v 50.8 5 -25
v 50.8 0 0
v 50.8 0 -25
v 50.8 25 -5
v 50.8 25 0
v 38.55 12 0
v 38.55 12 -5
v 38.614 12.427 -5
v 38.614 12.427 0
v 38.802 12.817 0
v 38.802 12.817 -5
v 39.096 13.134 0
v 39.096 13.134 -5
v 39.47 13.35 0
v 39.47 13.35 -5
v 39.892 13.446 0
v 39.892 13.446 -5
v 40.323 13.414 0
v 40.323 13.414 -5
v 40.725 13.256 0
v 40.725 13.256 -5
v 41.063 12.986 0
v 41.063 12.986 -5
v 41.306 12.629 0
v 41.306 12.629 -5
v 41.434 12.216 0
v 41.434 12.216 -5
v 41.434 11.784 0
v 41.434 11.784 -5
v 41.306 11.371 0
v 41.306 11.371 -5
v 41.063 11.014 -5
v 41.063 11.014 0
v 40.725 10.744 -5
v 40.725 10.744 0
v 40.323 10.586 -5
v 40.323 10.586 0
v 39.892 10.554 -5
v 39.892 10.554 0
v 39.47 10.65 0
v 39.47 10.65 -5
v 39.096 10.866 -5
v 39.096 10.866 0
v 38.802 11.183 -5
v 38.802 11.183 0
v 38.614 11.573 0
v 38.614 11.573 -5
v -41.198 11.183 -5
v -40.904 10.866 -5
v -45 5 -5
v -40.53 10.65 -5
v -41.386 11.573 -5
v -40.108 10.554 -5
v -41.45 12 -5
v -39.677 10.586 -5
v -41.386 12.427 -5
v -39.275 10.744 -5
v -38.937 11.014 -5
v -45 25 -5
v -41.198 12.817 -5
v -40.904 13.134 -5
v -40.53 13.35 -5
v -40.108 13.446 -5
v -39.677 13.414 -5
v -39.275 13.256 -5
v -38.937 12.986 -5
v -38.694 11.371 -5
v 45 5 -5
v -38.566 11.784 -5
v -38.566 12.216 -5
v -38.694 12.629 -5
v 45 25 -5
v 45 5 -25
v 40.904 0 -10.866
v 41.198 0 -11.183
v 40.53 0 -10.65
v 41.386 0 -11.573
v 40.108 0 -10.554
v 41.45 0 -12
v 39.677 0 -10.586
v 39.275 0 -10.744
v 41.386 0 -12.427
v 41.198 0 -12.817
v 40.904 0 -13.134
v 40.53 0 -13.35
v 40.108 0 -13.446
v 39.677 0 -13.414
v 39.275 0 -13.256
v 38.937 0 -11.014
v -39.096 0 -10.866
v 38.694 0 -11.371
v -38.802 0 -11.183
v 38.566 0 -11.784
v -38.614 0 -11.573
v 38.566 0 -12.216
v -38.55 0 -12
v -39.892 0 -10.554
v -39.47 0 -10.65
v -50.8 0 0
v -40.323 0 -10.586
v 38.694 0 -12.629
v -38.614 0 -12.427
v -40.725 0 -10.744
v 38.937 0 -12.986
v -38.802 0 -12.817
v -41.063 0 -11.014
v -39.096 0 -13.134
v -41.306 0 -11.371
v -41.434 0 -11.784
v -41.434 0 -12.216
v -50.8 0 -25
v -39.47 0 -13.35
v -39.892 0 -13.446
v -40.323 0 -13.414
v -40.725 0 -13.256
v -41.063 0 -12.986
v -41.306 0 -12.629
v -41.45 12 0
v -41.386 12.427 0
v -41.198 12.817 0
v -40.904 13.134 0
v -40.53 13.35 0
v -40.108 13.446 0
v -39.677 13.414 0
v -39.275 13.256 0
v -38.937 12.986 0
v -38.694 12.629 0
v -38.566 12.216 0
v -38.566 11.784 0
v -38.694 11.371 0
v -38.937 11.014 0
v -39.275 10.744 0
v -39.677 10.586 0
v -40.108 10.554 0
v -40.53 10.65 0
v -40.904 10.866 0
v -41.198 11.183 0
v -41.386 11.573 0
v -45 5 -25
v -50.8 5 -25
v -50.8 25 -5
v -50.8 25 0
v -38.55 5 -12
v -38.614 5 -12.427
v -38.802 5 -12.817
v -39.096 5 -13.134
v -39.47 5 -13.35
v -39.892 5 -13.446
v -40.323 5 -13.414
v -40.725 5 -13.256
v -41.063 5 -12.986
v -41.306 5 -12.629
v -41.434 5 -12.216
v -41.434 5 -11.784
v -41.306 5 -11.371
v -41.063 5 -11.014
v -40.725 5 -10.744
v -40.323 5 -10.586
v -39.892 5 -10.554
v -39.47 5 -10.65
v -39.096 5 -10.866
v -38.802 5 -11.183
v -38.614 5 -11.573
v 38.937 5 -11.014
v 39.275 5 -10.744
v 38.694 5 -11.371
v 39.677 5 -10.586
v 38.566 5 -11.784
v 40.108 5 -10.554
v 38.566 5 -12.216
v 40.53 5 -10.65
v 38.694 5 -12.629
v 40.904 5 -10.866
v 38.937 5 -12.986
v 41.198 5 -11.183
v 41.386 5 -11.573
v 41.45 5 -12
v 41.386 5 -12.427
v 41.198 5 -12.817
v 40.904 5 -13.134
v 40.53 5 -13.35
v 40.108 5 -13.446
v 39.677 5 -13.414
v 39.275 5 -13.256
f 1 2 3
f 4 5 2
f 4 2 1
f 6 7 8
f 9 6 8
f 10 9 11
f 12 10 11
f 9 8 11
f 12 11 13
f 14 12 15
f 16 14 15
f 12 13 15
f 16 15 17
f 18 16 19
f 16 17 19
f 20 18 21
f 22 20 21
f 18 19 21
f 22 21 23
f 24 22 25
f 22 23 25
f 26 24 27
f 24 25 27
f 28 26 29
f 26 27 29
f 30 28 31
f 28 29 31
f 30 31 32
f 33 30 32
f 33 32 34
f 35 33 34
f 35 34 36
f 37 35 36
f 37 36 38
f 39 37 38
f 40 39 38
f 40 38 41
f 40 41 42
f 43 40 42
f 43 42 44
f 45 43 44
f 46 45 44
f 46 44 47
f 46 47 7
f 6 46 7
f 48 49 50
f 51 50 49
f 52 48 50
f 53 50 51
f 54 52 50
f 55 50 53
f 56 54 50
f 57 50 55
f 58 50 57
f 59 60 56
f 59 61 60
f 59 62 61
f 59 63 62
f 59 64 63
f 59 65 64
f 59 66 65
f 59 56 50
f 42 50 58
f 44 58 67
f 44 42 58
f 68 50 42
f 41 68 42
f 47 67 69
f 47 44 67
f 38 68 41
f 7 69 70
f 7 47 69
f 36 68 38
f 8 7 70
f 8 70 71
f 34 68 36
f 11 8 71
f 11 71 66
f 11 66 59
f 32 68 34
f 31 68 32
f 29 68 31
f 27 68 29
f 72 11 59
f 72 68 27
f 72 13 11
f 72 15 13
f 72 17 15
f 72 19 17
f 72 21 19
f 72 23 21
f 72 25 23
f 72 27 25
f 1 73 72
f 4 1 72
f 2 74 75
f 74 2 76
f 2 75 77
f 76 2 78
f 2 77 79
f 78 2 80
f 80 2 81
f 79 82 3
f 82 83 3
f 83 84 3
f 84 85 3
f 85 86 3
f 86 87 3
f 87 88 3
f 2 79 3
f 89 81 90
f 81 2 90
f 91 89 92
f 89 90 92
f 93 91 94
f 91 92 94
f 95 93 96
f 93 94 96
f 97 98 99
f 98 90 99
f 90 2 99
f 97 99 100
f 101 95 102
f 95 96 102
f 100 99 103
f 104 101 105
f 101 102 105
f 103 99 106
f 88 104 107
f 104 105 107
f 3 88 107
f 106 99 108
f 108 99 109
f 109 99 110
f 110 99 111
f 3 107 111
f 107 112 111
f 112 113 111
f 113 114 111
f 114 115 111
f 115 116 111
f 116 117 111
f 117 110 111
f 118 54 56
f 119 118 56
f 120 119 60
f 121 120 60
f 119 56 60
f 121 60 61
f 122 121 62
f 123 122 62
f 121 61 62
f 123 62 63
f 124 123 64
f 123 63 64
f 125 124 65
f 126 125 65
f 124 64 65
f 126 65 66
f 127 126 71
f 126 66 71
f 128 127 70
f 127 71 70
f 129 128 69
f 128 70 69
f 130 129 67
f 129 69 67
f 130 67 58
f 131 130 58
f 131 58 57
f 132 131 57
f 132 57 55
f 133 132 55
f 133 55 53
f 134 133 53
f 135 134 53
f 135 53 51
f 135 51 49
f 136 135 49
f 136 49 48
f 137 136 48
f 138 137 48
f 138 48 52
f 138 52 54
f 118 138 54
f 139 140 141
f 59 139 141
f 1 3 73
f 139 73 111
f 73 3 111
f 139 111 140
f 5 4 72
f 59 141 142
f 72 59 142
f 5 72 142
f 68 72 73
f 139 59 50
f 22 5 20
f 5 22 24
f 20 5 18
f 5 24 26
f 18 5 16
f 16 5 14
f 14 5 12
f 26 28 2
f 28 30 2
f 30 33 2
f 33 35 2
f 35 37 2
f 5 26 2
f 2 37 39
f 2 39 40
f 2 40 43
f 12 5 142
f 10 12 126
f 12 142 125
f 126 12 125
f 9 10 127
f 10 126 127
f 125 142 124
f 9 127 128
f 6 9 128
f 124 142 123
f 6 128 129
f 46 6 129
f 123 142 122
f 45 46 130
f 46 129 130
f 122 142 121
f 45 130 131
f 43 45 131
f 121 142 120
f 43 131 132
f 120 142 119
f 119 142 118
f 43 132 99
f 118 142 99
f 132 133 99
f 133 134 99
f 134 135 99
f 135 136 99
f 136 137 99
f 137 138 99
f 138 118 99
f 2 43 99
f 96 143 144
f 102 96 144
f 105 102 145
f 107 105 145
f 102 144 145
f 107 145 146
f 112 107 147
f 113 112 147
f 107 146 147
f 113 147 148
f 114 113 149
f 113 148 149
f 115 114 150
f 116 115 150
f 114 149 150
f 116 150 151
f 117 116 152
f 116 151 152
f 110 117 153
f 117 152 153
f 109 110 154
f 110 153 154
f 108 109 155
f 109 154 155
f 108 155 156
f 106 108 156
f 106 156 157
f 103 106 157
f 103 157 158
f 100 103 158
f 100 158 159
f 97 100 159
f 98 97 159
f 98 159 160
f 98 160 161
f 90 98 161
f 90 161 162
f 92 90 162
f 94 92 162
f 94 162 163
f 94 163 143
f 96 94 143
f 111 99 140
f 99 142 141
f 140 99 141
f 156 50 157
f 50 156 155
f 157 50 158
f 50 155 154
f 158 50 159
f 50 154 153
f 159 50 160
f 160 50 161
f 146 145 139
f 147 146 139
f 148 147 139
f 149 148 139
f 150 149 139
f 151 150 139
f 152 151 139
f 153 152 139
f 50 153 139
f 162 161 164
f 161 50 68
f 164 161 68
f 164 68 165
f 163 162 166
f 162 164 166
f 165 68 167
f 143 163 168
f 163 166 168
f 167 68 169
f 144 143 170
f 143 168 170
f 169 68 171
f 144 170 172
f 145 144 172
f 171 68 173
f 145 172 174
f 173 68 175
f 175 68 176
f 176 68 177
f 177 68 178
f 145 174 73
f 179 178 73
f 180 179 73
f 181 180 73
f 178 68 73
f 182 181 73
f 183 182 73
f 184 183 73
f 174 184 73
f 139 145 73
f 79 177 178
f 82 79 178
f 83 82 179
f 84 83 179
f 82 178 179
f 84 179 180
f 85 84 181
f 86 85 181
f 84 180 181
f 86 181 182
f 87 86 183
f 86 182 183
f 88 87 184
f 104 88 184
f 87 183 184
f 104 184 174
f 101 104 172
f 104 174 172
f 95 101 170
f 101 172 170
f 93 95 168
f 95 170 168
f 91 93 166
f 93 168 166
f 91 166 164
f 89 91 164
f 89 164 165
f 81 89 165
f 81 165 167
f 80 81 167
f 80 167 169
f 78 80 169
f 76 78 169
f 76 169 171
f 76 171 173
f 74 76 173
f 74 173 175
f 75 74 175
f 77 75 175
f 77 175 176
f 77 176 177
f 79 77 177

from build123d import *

# Parameters (mm, degrees)
BOSS_EXTRUDE1_START = -50.8
BOSS_EXTRUDE1_DEPTH = 101.6
HOLLOW_START        = 45
SKETCH3_W           = 20
SKETCH3_H           = 20
HOLLOW_DEPTH        = 90
BOTTOM_HOLES_D      = 2.9
FRONT_HOLES_D       = 2.9


with BuildPart() as part:
    # Sketch1 → Boss-Extrude1 (new body)
    with BuildSketch(Plane(origin=(0, 0, 0), x_dir=(0, 0, -1), z_dir=(1, 0, 0)).offset(BOSS_EXTRUDE1_START)):
        Polygon((0, 25), (0, 0), (25, 0), (25, 5), (5, 25), align=None)
    extrude(amount=BOSS_EXTRUDE1_DEPTH)

    # Sketch3 → hollow (cut)
    with BuildSketch(Plane(origin=(0, 0, 0), x_dir=(0, 0, -1), z_dir=(1, 0, 0)).offset(HOLLOW_START)):
        with Locations((15, 15)):
            Rectangle(SKETCH3_W, SKETCH3_H)
    extrude(amount=-HOLLOW_DEPTH, mode=Mode.SUBTRACT)

    # bottom holes (through all)
    with Locations(Plane(origin=(0, 0, 0), x_dir=(-1, 0, 0), z_dir=(0, -1, 0))):
        with Locations((40, 12), (-40, 12)):
            Hole(BOTTOM_HOLES_D / 2)

    # front holes (through all)
    with Locations(Plane.XY):
        with Locations((-40, 12), (40, 12)):
            Hole(FRONT_HOLES_D / 2)


solid = part.part
